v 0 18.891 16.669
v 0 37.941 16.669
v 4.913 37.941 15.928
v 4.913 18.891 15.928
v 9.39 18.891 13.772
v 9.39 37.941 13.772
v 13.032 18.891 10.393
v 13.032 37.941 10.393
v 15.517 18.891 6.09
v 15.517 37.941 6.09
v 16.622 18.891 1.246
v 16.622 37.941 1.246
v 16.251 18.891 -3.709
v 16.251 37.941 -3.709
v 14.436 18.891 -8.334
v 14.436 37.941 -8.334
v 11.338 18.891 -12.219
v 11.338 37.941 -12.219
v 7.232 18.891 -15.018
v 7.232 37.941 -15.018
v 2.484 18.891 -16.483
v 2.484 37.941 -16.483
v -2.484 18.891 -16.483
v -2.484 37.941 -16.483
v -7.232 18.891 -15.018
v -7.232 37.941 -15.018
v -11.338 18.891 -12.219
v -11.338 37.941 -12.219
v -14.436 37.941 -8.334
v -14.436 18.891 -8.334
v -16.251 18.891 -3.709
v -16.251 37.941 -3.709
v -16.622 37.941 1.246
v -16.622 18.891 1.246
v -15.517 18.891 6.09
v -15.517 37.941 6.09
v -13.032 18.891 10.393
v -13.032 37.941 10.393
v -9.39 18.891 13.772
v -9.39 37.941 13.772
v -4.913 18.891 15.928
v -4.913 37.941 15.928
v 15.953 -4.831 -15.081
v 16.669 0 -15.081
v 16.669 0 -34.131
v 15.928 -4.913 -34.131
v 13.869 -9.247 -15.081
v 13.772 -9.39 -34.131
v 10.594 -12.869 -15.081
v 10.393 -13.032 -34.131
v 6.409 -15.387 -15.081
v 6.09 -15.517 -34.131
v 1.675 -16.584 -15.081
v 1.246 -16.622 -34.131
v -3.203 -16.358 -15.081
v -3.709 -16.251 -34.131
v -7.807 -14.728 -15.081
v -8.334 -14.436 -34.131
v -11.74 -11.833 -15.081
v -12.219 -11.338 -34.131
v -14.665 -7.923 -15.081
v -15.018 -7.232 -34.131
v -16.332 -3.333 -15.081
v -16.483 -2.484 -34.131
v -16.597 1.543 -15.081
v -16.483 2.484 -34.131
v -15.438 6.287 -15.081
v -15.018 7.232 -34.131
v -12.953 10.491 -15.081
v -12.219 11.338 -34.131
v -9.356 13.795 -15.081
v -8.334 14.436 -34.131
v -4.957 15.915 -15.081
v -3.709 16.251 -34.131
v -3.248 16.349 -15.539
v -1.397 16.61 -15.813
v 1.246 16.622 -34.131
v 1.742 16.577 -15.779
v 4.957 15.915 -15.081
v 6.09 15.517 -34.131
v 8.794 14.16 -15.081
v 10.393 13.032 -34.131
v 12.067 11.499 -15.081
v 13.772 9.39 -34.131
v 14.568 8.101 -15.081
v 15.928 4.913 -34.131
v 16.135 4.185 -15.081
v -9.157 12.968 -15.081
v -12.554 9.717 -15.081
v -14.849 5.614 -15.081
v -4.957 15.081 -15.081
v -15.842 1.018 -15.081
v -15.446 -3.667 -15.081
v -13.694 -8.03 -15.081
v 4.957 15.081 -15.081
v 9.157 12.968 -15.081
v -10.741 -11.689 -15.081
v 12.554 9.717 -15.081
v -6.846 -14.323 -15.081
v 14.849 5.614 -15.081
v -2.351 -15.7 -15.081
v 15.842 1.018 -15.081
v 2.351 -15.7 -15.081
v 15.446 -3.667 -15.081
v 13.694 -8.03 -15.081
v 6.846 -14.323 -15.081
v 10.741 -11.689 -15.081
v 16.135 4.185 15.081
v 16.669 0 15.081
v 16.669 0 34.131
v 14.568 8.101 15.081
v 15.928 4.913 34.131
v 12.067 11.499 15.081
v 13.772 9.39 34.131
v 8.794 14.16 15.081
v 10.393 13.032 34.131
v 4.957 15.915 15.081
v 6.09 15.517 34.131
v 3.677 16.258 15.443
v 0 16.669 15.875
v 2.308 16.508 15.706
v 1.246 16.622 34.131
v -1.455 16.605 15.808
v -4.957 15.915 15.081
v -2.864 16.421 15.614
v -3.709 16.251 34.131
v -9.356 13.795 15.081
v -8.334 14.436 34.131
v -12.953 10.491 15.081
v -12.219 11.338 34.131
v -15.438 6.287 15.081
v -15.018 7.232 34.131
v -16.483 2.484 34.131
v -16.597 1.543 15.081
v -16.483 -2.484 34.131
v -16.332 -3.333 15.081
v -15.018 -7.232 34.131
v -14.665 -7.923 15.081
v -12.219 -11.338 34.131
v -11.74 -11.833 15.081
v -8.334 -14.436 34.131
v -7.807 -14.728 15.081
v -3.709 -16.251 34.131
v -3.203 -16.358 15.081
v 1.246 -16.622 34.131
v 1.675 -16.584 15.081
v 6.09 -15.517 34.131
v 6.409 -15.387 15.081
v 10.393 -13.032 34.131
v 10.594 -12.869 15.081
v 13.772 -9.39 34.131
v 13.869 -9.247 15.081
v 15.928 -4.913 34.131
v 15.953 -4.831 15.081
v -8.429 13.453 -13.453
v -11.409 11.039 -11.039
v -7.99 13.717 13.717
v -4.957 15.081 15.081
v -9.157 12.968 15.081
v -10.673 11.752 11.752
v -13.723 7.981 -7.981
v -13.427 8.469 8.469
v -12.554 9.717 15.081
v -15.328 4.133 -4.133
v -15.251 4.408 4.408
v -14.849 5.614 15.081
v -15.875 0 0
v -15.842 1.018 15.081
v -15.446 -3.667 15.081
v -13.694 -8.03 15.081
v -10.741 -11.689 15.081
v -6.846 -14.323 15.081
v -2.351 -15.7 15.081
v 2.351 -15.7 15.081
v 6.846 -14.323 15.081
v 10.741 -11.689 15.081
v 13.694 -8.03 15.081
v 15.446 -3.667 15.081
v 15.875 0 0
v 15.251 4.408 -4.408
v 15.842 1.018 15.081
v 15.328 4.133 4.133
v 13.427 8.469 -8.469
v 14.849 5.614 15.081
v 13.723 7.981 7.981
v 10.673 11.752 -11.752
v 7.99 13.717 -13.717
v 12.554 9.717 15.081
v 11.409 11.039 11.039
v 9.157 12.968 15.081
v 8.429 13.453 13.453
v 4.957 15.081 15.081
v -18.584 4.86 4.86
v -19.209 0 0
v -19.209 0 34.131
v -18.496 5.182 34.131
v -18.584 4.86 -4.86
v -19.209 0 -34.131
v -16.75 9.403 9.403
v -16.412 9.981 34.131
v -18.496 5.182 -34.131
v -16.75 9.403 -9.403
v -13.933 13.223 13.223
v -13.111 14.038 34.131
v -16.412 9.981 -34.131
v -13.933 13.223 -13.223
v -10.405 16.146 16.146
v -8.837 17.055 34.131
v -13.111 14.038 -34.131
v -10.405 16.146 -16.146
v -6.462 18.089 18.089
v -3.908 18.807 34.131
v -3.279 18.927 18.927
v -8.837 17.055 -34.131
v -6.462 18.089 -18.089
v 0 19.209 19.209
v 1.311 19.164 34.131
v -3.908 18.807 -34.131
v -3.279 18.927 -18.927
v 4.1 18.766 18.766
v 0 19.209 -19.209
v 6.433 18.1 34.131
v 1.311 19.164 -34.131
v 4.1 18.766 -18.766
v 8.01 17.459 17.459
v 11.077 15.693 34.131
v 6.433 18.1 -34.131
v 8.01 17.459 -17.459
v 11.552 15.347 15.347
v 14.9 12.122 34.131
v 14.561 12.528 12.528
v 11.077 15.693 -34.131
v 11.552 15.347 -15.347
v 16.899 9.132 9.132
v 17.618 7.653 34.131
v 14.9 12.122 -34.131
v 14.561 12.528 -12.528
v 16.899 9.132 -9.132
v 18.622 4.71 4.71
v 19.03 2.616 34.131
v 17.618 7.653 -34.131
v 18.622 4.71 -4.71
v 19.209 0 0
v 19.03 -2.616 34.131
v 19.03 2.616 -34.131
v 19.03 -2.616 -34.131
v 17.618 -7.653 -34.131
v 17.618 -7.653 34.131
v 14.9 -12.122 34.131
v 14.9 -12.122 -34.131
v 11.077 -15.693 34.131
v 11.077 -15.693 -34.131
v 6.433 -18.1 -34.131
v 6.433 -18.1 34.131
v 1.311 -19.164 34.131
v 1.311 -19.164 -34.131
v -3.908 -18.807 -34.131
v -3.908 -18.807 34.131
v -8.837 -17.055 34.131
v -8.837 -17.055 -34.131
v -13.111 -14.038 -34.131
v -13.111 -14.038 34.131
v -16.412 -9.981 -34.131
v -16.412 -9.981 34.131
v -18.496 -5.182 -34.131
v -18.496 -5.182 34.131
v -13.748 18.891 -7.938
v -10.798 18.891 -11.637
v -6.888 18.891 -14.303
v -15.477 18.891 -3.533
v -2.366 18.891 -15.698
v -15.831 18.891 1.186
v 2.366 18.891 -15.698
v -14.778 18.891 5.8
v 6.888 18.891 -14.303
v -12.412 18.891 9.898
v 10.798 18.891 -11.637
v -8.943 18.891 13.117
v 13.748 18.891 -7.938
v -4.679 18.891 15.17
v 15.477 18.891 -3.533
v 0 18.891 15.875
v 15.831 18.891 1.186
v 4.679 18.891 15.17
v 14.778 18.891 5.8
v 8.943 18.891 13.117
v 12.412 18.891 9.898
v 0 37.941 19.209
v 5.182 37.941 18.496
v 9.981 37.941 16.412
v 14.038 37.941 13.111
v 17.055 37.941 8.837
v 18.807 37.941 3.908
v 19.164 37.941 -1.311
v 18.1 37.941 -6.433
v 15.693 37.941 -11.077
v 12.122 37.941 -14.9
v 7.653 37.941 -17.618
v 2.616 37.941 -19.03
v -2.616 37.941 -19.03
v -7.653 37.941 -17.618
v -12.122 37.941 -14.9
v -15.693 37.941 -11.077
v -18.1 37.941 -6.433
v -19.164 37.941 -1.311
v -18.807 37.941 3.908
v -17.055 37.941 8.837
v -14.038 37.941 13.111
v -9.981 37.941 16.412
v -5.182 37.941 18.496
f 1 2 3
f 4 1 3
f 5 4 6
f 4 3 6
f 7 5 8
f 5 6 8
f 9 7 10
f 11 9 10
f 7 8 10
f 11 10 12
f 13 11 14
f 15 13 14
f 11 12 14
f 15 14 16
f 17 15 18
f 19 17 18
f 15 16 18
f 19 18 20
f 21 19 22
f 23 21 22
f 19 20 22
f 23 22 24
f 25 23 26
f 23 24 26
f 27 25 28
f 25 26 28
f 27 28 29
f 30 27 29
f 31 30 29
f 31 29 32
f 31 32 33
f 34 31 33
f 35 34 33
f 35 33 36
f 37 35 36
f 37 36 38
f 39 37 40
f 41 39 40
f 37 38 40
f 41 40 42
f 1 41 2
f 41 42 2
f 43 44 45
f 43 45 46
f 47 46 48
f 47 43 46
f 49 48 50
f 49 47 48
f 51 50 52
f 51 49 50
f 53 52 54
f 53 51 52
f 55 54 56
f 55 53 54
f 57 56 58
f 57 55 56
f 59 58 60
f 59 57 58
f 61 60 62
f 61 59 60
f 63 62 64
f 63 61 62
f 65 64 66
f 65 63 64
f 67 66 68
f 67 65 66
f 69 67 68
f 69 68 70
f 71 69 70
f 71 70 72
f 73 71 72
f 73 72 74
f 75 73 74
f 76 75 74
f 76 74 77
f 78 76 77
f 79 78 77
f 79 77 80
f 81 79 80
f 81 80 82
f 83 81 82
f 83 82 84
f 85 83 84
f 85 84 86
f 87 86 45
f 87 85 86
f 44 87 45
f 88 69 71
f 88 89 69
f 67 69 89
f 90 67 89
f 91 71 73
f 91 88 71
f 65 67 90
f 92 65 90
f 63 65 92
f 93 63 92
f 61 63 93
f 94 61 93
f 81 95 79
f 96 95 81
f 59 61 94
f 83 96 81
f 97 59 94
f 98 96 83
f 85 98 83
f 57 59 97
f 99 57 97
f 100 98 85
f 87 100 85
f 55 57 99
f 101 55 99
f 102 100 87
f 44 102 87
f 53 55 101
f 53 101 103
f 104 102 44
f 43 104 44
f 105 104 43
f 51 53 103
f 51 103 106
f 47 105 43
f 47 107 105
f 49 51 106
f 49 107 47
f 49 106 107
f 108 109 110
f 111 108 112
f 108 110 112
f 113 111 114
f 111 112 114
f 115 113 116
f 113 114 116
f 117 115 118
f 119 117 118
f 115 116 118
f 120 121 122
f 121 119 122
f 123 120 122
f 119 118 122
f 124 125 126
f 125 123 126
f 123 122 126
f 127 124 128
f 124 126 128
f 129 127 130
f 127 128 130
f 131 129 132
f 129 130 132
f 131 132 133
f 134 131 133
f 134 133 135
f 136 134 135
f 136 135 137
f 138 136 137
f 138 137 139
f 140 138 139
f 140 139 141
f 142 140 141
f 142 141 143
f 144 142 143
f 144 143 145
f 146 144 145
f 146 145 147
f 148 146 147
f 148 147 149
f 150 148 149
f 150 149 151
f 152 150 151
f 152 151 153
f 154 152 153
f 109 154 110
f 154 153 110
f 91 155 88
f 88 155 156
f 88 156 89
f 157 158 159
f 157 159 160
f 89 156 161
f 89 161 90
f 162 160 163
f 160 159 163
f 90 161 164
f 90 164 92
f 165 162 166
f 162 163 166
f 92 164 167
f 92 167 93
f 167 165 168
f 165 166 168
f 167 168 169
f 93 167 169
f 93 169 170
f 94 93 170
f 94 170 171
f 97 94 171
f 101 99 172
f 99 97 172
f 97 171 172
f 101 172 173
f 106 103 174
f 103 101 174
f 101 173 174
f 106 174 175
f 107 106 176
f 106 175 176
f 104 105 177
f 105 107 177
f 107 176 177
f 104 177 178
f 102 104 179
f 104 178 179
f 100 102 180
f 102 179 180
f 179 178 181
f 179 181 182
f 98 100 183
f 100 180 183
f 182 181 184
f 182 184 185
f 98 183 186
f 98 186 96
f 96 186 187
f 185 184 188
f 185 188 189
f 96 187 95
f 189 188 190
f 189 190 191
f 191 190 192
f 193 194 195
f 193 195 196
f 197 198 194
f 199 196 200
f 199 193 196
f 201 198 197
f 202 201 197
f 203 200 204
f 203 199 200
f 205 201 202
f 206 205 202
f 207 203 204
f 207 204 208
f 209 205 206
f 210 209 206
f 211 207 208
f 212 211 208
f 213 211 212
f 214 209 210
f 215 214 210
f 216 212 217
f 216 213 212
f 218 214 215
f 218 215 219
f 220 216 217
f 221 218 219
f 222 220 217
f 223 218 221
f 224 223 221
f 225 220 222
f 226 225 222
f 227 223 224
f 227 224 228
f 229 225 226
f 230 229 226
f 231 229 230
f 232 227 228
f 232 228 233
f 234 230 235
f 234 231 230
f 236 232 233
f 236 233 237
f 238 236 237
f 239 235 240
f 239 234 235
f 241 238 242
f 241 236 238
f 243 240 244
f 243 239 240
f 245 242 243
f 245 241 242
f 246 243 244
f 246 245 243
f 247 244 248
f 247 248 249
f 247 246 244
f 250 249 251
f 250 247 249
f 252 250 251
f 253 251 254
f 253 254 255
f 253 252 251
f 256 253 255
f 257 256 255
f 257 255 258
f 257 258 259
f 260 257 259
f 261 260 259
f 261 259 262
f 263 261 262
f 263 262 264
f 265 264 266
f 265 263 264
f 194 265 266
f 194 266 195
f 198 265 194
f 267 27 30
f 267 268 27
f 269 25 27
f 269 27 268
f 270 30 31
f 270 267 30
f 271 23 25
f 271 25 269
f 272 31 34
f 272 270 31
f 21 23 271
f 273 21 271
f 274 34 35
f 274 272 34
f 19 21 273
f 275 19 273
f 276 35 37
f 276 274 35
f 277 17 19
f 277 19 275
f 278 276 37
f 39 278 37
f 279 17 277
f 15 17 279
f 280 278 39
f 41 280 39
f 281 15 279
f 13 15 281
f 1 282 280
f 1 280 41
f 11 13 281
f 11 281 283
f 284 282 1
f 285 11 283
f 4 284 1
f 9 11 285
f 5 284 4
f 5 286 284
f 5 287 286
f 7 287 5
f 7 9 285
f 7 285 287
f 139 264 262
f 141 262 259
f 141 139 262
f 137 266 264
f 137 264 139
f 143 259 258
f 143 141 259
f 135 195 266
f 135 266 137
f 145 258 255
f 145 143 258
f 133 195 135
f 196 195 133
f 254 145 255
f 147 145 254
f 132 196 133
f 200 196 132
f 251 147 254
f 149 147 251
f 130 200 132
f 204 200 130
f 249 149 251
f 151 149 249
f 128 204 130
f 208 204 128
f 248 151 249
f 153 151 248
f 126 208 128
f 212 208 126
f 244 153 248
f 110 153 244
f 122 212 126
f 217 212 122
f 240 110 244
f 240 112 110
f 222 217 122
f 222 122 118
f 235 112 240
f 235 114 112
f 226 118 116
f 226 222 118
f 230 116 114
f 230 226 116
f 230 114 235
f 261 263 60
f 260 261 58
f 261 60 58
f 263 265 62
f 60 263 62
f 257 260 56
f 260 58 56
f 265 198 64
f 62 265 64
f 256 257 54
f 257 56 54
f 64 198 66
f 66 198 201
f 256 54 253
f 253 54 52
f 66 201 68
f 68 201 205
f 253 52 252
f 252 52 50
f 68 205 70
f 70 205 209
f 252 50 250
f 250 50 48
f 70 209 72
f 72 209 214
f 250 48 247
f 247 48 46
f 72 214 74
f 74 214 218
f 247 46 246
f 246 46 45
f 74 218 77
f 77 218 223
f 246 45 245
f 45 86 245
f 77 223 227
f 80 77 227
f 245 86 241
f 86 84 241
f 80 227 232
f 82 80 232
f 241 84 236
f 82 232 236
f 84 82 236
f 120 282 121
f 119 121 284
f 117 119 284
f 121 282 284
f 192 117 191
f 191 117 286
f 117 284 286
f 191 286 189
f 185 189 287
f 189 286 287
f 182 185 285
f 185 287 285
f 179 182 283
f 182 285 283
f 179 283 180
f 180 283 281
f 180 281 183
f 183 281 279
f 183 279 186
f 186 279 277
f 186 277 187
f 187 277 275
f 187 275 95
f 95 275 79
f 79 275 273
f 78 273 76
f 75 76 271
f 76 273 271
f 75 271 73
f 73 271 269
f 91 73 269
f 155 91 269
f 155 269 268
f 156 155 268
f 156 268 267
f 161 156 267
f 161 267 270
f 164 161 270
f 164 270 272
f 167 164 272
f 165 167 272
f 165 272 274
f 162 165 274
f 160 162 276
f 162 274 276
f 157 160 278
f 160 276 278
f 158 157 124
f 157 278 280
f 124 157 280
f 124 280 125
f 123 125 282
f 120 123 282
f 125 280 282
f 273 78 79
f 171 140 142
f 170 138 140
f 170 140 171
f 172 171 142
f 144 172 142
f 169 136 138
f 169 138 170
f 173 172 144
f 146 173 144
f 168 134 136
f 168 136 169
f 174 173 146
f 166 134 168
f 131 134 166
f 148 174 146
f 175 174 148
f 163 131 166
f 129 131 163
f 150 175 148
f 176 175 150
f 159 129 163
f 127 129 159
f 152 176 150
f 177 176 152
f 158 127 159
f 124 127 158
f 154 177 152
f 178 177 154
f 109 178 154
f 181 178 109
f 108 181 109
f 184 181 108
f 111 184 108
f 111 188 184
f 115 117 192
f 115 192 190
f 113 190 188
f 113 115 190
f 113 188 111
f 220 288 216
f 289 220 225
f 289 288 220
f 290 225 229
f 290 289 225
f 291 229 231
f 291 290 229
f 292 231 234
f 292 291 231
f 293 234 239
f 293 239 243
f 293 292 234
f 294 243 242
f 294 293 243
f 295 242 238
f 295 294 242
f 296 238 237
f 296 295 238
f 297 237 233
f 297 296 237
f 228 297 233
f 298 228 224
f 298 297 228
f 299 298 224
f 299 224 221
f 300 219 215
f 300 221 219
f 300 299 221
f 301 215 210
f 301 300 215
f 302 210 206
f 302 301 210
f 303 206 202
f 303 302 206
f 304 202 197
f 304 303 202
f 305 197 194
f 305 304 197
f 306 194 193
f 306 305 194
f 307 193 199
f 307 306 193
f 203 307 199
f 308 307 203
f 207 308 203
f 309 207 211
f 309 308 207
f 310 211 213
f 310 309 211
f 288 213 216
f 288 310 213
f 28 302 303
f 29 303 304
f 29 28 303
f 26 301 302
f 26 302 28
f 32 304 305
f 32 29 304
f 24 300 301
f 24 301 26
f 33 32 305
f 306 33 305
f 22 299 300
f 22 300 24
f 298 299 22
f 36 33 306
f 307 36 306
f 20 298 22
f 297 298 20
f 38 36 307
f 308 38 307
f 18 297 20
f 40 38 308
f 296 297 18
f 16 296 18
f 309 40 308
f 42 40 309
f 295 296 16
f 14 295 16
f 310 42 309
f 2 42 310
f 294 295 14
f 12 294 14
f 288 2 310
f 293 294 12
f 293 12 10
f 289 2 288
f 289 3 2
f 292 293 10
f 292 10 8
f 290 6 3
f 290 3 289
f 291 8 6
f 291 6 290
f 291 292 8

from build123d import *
from build123d.topology import SkipClean

# Parameters (mm, degrees)
SKETCH1_W               = 19.20875
SKETCH1_H               = 68.2625
SKETCH2_W               = 19.20875
SKETCH2_H               = 37.94125
SKETCH7_R               = 15.875
CUT_EXTRUDE1_DEPTH      = 81.425639161
CUT_EXTRUDE2_REACH      = 71.282
CUT_EXTRUDE2_END_RADIUS = 15.875
SKETCH8_R               = 15.875
SKETCH9_R               = 16.66875
CUT_EXTRUDE3_DEPTH      = 19.05
CUT_EXTRUDE4_START      = -19.05
SKETCH10_R              = 16.66875
CUT_EXTRUDE4_DEPTH      = 19.05
SKETCH11_R              = 16.66875
CUT_EXTRUDE5_DEPTH      = 19.05


with BuildPart() as part:
    # Sketch1 → Revolve1 (revolve)
    with BuildSketch(Plane(origin=(0, 0, 0), x_dir=(1, 0, 0), z_dir=(0, 1, 0)), mode=Mode.PRIVATE) as revolve1_sk:
        with Locations((9.604375, 0)):
            Rectangle(SKETCH1_W, SKETCH1_H)
    revolve(revolve1_sk.sketch.rotate(Axis((0, 0, 118.243982537), (0, 0, -1)), 180), axis=Axis((0, 0, 118.243982537), (0, 0, -1)))

    # Sketch2 → Revolve2 (revolve)
    with BuildSketch(Plane.XY, mode=Mode.PRIVATE) as revolve2_sk:
        with Locations((-9.604375, 18.970625)):
            Rectangle(SKETCH2_W, SKETCH2_H)
    revolve(revolve2_sk.sketch.rotate(Axis((0, 0, 0), (0, 1, 0)), 90), axis=Axis((0, 0, 0), (0, 1, 0)))

    # Sketch7 → Cut-Extrude1 (cut, through all)
    with BuildSketch(Plane.XY.offset(34.13125)):
        Circle(SKETCH7_R)
    extrude(amount=-CUT_EXTRUDE1_DEPTH, mode=Mode.SUBTRACT)

    # Cut-Extrude2: up to this cylinder (the profile starts outside it)
    cut_extrude2_end = Plane(origin=(0, 0, 0), z_dir=(0, 0, 1)) * Cylinder(CUT_EXTRUDE2_END_RADIUS, 175.314, mode=Mode.PRIVATE)
    # Sketch8 → Cut-Extrude2 (cut, up to the surface)
    with BuildSketch(Plane(origin=(0, 37.94125, 0), x_dir=(1, 0, 0), z_dir=(0, 1, 0)), mode=Mode.PRIVATE) as cut_extrude2_sk1:
        with Locations(Location((0, 0, 0), (0, 0, 270))):
            Circle(SKETCH8_R)
    cut_extrude2_tool1 = extrude(cut_extrude2_sk1.sketch, amount=-CUT_EXTRUDE2_REACH, mode=Mode.PRIVATE) - cut_extrude2_end
    add(cut_extrude2_tool1.solids().sort_by_distance((0, 37.94125, 0))[0], mode=Mode.SUBTRACT)

    # Sketch9 → Cut-Extrude3 (cut)
    with SkipClean():  # the faces are left unmerged after this step: merging them gives an invalid solid
        with BuildSketch(Plane.XY.offset(34.13125)):
            Circle(SKETCH9_R)
        extrude(amount=-CUT_EXTRUDE3_DEPTH, mode=Mode.SUBTRACT)

    # Sketch10 → Cut-Extrude4 (cut)
    with BuildSketch(Plane(origin=(0, 0, -34.13125), x_dir=(-1, 0, 0), z_dir=(0, 0, -1)).offset(CUT_EXTRUDE4_START)):
        with Locations(Location((0, 0, 0), (0, 0, 180))):
            Circle(SKETCH10_R)
    extrude(amount=CUT_EXTRUDE4_DEPTH, mode=Mode.SUBTRACT)

    # Sketch11 → Cut-Extrude5 (cut)
    with BuildSketch(Plane(origin=(0, 37.94125, 0), x_dir=(1, 0, 0), z_dir=(0, 1, 0))):
        with Locations(Location((0, 0, 0), (0, 0, 270))):
            Circle(SKETCH11_R)
    extrude(amount=-CUT_EXTRUDE5_DEPTH, mode=Mode.SUBTRACT)


solid = part.part
